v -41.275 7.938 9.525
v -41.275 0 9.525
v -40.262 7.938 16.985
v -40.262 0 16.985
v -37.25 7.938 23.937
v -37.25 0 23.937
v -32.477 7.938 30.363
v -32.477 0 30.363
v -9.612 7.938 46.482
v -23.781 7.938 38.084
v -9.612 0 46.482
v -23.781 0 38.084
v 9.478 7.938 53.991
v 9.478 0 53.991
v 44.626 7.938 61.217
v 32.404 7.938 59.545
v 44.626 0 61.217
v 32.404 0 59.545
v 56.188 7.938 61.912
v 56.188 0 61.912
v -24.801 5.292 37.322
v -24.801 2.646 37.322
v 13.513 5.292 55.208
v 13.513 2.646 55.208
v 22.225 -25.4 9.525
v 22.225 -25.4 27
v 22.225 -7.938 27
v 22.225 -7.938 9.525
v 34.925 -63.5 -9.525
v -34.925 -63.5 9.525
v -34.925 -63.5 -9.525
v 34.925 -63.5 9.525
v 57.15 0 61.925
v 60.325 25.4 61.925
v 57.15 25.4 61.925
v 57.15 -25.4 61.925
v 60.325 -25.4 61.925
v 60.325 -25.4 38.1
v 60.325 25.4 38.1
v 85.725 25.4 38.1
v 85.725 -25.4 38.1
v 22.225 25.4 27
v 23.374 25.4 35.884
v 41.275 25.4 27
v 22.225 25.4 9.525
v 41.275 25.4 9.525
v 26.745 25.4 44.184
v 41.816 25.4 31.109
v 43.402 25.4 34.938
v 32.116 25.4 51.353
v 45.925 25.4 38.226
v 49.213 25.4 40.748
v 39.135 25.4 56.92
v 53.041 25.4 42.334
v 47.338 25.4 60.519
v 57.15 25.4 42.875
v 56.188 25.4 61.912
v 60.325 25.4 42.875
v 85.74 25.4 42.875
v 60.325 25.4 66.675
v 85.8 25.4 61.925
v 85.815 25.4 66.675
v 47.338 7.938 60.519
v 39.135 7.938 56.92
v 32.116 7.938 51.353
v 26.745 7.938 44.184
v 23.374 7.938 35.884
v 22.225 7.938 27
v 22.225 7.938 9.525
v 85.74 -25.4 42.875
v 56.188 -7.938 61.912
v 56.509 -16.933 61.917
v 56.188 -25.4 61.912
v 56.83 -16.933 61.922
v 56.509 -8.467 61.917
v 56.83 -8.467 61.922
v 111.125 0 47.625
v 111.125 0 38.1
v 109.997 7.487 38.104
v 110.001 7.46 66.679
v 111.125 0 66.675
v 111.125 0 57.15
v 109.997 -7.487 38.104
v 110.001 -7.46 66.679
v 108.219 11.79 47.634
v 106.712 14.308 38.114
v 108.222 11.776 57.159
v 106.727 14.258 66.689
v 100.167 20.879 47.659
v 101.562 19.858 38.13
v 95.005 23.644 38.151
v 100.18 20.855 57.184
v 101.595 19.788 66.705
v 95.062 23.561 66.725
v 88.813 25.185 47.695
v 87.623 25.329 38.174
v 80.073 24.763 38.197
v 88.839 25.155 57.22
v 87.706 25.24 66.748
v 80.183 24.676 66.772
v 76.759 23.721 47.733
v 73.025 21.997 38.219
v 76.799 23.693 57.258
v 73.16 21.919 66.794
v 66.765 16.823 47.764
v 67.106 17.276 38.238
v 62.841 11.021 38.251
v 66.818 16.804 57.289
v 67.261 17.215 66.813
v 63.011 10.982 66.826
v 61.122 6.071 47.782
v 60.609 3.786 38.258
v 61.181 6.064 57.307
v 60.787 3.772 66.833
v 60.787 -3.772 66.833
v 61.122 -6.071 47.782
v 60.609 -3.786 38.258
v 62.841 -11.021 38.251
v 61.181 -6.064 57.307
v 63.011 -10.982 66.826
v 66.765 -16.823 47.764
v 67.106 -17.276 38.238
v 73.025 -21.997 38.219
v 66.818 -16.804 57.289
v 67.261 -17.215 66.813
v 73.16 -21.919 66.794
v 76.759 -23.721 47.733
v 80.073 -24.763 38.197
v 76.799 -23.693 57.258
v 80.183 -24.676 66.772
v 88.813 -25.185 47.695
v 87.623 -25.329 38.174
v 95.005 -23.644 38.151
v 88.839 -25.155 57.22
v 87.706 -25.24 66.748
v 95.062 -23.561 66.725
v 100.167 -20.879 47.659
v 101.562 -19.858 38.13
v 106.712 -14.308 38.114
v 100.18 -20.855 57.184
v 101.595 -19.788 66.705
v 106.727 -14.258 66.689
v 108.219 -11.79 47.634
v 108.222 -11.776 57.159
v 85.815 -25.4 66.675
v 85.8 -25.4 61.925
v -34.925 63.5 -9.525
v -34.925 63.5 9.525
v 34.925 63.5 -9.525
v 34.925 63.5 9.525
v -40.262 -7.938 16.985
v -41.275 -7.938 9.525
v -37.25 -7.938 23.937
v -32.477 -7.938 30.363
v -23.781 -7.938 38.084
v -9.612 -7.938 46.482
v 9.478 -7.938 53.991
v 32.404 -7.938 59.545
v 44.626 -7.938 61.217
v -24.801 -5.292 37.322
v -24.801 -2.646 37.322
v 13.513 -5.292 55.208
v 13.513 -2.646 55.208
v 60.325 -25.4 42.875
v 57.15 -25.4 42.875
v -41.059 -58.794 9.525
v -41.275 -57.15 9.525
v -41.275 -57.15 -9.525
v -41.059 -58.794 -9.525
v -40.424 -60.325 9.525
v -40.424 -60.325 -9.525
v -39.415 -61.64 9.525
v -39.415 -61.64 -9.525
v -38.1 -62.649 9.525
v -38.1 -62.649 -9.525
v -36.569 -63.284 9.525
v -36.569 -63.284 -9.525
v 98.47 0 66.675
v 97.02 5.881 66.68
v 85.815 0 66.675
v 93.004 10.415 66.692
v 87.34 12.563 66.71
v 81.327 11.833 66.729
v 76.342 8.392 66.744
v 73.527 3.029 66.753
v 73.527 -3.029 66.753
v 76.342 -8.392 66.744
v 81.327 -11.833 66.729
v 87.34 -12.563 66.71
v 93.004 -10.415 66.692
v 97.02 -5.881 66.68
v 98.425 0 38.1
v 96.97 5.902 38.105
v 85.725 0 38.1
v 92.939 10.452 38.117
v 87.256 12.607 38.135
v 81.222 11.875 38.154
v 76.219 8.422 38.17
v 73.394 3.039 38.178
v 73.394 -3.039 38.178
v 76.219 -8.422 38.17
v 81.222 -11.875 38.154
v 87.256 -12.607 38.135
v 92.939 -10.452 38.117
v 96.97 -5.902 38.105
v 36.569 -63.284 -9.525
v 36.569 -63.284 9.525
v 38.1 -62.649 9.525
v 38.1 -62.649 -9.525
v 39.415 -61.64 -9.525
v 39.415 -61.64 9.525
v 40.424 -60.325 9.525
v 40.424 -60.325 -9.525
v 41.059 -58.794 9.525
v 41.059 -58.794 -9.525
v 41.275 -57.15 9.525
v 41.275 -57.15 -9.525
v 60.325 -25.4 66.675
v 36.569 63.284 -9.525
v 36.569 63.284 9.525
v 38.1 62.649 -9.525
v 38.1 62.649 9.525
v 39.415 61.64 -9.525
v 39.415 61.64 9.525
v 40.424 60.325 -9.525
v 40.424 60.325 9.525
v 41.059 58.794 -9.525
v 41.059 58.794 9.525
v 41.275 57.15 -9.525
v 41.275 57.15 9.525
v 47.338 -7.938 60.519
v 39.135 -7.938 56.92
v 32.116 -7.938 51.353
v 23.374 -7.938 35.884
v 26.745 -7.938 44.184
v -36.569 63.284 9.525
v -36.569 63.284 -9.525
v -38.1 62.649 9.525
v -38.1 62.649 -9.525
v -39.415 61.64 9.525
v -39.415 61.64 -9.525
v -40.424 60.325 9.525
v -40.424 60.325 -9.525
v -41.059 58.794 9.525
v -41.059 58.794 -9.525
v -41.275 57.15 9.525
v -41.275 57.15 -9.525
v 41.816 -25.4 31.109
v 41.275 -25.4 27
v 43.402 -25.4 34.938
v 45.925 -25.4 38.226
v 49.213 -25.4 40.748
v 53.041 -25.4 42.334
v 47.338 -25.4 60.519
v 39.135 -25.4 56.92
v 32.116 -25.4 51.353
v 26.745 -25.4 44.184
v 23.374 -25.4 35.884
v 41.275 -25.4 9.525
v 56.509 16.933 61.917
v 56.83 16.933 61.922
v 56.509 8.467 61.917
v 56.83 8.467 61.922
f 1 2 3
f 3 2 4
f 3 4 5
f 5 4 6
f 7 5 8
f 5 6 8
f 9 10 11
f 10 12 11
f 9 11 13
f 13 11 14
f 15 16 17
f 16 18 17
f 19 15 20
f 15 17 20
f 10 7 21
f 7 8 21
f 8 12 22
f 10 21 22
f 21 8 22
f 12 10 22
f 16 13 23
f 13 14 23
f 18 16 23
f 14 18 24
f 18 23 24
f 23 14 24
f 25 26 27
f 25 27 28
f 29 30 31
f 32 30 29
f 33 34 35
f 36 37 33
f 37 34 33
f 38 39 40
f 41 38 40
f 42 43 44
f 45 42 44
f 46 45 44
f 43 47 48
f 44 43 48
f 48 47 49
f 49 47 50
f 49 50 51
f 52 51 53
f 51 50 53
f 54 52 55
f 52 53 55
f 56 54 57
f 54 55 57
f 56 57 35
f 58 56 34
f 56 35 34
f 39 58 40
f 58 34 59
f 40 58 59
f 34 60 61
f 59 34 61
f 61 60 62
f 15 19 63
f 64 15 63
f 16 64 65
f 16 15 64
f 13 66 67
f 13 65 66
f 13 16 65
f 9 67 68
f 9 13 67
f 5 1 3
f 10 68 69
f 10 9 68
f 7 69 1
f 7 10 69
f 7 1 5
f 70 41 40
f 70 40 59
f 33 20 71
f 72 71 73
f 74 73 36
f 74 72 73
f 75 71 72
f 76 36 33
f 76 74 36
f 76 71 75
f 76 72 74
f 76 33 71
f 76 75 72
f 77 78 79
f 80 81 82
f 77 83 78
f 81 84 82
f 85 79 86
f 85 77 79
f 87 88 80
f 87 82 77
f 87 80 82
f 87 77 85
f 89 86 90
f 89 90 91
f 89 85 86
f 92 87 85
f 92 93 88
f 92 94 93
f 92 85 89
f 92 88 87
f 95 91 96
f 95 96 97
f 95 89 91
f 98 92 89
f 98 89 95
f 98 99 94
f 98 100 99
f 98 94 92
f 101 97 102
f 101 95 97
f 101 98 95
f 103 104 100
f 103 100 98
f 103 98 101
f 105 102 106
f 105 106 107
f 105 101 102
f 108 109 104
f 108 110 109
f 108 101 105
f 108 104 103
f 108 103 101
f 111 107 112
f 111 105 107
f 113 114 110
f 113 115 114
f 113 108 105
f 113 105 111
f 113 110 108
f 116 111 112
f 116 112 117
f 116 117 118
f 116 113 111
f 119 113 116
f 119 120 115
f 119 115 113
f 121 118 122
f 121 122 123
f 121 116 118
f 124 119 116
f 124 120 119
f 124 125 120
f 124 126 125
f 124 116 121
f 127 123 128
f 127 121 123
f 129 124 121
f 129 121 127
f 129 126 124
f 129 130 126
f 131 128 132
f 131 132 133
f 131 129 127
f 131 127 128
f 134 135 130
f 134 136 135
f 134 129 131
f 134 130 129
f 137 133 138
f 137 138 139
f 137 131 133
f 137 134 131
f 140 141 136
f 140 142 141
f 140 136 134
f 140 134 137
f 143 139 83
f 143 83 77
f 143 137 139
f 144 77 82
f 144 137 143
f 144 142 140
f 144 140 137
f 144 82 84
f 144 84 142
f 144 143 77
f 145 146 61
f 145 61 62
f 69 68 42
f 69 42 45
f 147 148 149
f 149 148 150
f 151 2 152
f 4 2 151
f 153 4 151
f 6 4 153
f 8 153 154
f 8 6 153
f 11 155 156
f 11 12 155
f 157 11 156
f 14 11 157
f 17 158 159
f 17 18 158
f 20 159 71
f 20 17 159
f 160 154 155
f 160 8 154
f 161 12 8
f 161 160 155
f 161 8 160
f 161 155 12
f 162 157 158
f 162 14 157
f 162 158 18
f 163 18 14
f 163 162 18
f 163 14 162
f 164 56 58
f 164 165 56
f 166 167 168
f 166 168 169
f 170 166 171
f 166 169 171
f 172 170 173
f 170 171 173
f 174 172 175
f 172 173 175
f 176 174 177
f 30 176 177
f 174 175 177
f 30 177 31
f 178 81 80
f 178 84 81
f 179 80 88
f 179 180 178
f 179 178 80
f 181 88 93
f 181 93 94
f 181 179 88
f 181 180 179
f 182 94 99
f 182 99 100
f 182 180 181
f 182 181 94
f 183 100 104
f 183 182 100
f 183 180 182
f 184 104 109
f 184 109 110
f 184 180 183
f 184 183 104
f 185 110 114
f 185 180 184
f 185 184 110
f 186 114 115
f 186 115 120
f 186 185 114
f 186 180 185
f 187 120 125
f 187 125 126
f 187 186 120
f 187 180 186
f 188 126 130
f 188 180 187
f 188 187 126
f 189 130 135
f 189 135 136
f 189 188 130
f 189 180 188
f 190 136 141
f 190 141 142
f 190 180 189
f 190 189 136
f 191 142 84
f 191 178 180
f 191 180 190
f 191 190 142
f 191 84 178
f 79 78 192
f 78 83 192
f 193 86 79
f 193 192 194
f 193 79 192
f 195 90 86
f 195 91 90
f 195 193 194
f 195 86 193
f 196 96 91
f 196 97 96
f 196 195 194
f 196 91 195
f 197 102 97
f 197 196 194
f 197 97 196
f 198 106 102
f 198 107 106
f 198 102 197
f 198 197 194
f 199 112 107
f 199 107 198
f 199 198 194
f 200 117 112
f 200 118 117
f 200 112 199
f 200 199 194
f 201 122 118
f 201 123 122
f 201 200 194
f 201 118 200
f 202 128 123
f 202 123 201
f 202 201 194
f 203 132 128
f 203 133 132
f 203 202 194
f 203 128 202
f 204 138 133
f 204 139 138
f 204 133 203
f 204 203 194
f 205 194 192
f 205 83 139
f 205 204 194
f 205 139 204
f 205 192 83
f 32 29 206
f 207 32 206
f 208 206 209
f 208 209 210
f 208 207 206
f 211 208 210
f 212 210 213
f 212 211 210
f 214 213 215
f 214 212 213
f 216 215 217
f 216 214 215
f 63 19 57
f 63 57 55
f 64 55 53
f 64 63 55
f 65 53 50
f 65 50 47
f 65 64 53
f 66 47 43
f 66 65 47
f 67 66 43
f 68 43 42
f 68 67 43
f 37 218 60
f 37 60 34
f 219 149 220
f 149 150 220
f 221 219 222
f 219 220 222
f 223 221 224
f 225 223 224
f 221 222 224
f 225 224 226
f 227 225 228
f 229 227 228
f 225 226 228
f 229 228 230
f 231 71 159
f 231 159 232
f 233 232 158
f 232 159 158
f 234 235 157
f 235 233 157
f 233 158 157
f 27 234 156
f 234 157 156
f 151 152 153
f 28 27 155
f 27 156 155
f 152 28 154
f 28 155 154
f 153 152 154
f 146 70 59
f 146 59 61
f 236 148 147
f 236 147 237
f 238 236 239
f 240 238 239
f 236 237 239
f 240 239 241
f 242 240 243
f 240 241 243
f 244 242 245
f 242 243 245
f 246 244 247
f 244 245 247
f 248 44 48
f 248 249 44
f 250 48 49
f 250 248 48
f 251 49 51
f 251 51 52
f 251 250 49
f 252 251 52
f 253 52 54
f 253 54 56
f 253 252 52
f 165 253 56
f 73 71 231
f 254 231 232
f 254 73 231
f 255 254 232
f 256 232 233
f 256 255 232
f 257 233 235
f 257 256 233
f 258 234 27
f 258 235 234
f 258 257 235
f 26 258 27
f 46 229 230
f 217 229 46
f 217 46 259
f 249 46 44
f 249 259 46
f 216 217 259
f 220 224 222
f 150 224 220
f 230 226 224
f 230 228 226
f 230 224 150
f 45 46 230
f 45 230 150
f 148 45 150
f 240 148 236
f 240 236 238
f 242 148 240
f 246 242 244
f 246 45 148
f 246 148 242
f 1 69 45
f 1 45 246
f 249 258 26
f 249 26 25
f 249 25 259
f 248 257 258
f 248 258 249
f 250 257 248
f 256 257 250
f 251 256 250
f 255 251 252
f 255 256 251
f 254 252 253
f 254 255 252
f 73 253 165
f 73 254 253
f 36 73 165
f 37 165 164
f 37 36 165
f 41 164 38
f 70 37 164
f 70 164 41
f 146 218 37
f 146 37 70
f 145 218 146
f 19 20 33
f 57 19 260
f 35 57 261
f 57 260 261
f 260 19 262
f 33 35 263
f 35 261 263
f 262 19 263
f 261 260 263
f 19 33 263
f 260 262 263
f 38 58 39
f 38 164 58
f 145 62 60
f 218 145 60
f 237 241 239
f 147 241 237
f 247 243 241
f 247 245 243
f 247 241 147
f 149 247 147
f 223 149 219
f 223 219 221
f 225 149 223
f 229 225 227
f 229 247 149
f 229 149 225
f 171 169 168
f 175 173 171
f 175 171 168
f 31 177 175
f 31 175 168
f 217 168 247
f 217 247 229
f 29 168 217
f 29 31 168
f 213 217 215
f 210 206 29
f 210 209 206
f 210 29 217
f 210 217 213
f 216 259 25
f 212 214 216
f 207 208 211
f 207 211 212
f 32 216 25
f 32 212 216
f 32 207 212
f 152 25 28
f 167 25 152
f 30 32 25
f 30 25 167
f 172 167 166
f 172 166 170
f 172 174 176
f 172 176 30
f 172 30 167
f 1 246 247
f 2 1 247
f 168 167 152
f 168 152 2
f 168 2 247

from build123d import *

# Parameters (mm, degrees)
F1_DEPTH = 63.5
F2_DEPTH = 25.4
F3_DEPTH = 7.9375
F5_R     = 6.35
F6_R     = 6.35


with BuildPart() as f1:
    # F0 (on Front) → F1 (new body, symmetric)
    with BuildSketch(Plane.XZ):
        Polygon((22.225, 9.525), (-41.275, 9.525), (-41.275, -9.525), (41.275, -9.525), (41.275, 9.525), align=None)
    extrude(amount=F1_DEPTH, both=True)

    # F0 (on Front) → F2 (join, symmetric)
    with BuildSketch(Plane.XZ):
        Polygon((85.739969867, 42.8752), (60.325, 42.8752), (60.325, 38.1), (85.725, 38.1), align=None)
        with BuildLine():
            Line((22.225, 27.0002), (22.225, 9.525))
            Line((22.225, 9.525), (41.275, 9.525))
            Line((41.275, 9.525), (41.275, 27.0002))
            ThreePointArc((41.275, 27.0002), (45.9246798487, 38.2255201513), (57.15, 42.8752))
            Line((57.15, 42.8752), (60.325, 42.8752))
            Line((60.325, 42.8752), (60.325, 61.9252))
            Line((60.325, 61.9252), (57.15, 61.9252))
            add(Edge.make_bspline(
                [(56.1875558467, 61.9119362251), (56.509726576, 61.9176313259), (56.8305560447, 61.9220536557), (57.15, 61.9252)],
                knots=[110.5915947466, 110.5915947466, 110.5915947466, 110.5915947466, 111.5045361635, 111.5045361635, 111.5045361635, 111.5045361635], degree=3))
            ThreePointArc((56.1875558467, 61.9119362251), (32.1163327991, 51.3532517897), (22.225, 27.0002))
        make_face()
        Polygon((85.7996900812, 61.9252), (60.325, 61.9252), (60.325, 42.8752), (85.739969867, 42.8752), align=None)
        Polygon((60.325, 66.675), (60.325, 61.9252), (85.7996900812, 61.9252), (85.8145803213, 66.675), align=None)
    extrude(amount=F2_DEPTH, both=True)

    # F0 (on Front) → F3 (join, symmetric)
    with BuildSketch(Plane.XZ):
        with BuildLine():
            add(Edge.make_bspline(
                [(-41.275, 9.525), (-41.5485716533, 41.8550857499), (17.1605448387, 61.2220449946), (56.1875558467, 61.9119362251)],
                knots=[0, 0, 0, 0, 110.5915947466, 110.5915947466, 110.5915947466, 110.5915947466], degree=3))
            Line((-41.275, 9.525), (22.225, 9.525))
            Line((22.225, 9.525), (22.225, 27.0002))
            ThreePointArc((22.225, 27.0002), (32.1163327991, 51.3532517897), (56.1875558467, 61.9119362251))
        make_face()
    extrude(amount=F3_DEPTH, both=True)

    # F5
    f5_edges = [f1.edges().sort_by_distance(p)[0] for p in [
        (41.275, -63.5, 0),
        (41.275, 63.5, 0),
    ]]
    fillet(f5_edges, radius=F5_R)

    # F6
    f6_edges = [f1.edges().sort_by_distance(p)[0] for p in [
        (-41.275, -63.5, 0),
        (-41.275, 63.5, 0),
    ]]
    fillet(f6_edges, radius=F6_R)


with BuildPart() as f4:
    # F0 (on Front) → F4 (revolve)
    with BuildSketch(Plane.XZ):
        Polygon((85.8145803213, 66.675), (85.7996900812, 61.9252), (85.739969867, 42.8752), (85.725, 38.1), (111.125, 38.1), (111.125, 66.675), align=None)
    revolve(axis=Axis((85.7697901607, 0, 52.3875), (0.003134904, 0, 0.9999950862)))


solid = Compound([f1.part, f4.part])
